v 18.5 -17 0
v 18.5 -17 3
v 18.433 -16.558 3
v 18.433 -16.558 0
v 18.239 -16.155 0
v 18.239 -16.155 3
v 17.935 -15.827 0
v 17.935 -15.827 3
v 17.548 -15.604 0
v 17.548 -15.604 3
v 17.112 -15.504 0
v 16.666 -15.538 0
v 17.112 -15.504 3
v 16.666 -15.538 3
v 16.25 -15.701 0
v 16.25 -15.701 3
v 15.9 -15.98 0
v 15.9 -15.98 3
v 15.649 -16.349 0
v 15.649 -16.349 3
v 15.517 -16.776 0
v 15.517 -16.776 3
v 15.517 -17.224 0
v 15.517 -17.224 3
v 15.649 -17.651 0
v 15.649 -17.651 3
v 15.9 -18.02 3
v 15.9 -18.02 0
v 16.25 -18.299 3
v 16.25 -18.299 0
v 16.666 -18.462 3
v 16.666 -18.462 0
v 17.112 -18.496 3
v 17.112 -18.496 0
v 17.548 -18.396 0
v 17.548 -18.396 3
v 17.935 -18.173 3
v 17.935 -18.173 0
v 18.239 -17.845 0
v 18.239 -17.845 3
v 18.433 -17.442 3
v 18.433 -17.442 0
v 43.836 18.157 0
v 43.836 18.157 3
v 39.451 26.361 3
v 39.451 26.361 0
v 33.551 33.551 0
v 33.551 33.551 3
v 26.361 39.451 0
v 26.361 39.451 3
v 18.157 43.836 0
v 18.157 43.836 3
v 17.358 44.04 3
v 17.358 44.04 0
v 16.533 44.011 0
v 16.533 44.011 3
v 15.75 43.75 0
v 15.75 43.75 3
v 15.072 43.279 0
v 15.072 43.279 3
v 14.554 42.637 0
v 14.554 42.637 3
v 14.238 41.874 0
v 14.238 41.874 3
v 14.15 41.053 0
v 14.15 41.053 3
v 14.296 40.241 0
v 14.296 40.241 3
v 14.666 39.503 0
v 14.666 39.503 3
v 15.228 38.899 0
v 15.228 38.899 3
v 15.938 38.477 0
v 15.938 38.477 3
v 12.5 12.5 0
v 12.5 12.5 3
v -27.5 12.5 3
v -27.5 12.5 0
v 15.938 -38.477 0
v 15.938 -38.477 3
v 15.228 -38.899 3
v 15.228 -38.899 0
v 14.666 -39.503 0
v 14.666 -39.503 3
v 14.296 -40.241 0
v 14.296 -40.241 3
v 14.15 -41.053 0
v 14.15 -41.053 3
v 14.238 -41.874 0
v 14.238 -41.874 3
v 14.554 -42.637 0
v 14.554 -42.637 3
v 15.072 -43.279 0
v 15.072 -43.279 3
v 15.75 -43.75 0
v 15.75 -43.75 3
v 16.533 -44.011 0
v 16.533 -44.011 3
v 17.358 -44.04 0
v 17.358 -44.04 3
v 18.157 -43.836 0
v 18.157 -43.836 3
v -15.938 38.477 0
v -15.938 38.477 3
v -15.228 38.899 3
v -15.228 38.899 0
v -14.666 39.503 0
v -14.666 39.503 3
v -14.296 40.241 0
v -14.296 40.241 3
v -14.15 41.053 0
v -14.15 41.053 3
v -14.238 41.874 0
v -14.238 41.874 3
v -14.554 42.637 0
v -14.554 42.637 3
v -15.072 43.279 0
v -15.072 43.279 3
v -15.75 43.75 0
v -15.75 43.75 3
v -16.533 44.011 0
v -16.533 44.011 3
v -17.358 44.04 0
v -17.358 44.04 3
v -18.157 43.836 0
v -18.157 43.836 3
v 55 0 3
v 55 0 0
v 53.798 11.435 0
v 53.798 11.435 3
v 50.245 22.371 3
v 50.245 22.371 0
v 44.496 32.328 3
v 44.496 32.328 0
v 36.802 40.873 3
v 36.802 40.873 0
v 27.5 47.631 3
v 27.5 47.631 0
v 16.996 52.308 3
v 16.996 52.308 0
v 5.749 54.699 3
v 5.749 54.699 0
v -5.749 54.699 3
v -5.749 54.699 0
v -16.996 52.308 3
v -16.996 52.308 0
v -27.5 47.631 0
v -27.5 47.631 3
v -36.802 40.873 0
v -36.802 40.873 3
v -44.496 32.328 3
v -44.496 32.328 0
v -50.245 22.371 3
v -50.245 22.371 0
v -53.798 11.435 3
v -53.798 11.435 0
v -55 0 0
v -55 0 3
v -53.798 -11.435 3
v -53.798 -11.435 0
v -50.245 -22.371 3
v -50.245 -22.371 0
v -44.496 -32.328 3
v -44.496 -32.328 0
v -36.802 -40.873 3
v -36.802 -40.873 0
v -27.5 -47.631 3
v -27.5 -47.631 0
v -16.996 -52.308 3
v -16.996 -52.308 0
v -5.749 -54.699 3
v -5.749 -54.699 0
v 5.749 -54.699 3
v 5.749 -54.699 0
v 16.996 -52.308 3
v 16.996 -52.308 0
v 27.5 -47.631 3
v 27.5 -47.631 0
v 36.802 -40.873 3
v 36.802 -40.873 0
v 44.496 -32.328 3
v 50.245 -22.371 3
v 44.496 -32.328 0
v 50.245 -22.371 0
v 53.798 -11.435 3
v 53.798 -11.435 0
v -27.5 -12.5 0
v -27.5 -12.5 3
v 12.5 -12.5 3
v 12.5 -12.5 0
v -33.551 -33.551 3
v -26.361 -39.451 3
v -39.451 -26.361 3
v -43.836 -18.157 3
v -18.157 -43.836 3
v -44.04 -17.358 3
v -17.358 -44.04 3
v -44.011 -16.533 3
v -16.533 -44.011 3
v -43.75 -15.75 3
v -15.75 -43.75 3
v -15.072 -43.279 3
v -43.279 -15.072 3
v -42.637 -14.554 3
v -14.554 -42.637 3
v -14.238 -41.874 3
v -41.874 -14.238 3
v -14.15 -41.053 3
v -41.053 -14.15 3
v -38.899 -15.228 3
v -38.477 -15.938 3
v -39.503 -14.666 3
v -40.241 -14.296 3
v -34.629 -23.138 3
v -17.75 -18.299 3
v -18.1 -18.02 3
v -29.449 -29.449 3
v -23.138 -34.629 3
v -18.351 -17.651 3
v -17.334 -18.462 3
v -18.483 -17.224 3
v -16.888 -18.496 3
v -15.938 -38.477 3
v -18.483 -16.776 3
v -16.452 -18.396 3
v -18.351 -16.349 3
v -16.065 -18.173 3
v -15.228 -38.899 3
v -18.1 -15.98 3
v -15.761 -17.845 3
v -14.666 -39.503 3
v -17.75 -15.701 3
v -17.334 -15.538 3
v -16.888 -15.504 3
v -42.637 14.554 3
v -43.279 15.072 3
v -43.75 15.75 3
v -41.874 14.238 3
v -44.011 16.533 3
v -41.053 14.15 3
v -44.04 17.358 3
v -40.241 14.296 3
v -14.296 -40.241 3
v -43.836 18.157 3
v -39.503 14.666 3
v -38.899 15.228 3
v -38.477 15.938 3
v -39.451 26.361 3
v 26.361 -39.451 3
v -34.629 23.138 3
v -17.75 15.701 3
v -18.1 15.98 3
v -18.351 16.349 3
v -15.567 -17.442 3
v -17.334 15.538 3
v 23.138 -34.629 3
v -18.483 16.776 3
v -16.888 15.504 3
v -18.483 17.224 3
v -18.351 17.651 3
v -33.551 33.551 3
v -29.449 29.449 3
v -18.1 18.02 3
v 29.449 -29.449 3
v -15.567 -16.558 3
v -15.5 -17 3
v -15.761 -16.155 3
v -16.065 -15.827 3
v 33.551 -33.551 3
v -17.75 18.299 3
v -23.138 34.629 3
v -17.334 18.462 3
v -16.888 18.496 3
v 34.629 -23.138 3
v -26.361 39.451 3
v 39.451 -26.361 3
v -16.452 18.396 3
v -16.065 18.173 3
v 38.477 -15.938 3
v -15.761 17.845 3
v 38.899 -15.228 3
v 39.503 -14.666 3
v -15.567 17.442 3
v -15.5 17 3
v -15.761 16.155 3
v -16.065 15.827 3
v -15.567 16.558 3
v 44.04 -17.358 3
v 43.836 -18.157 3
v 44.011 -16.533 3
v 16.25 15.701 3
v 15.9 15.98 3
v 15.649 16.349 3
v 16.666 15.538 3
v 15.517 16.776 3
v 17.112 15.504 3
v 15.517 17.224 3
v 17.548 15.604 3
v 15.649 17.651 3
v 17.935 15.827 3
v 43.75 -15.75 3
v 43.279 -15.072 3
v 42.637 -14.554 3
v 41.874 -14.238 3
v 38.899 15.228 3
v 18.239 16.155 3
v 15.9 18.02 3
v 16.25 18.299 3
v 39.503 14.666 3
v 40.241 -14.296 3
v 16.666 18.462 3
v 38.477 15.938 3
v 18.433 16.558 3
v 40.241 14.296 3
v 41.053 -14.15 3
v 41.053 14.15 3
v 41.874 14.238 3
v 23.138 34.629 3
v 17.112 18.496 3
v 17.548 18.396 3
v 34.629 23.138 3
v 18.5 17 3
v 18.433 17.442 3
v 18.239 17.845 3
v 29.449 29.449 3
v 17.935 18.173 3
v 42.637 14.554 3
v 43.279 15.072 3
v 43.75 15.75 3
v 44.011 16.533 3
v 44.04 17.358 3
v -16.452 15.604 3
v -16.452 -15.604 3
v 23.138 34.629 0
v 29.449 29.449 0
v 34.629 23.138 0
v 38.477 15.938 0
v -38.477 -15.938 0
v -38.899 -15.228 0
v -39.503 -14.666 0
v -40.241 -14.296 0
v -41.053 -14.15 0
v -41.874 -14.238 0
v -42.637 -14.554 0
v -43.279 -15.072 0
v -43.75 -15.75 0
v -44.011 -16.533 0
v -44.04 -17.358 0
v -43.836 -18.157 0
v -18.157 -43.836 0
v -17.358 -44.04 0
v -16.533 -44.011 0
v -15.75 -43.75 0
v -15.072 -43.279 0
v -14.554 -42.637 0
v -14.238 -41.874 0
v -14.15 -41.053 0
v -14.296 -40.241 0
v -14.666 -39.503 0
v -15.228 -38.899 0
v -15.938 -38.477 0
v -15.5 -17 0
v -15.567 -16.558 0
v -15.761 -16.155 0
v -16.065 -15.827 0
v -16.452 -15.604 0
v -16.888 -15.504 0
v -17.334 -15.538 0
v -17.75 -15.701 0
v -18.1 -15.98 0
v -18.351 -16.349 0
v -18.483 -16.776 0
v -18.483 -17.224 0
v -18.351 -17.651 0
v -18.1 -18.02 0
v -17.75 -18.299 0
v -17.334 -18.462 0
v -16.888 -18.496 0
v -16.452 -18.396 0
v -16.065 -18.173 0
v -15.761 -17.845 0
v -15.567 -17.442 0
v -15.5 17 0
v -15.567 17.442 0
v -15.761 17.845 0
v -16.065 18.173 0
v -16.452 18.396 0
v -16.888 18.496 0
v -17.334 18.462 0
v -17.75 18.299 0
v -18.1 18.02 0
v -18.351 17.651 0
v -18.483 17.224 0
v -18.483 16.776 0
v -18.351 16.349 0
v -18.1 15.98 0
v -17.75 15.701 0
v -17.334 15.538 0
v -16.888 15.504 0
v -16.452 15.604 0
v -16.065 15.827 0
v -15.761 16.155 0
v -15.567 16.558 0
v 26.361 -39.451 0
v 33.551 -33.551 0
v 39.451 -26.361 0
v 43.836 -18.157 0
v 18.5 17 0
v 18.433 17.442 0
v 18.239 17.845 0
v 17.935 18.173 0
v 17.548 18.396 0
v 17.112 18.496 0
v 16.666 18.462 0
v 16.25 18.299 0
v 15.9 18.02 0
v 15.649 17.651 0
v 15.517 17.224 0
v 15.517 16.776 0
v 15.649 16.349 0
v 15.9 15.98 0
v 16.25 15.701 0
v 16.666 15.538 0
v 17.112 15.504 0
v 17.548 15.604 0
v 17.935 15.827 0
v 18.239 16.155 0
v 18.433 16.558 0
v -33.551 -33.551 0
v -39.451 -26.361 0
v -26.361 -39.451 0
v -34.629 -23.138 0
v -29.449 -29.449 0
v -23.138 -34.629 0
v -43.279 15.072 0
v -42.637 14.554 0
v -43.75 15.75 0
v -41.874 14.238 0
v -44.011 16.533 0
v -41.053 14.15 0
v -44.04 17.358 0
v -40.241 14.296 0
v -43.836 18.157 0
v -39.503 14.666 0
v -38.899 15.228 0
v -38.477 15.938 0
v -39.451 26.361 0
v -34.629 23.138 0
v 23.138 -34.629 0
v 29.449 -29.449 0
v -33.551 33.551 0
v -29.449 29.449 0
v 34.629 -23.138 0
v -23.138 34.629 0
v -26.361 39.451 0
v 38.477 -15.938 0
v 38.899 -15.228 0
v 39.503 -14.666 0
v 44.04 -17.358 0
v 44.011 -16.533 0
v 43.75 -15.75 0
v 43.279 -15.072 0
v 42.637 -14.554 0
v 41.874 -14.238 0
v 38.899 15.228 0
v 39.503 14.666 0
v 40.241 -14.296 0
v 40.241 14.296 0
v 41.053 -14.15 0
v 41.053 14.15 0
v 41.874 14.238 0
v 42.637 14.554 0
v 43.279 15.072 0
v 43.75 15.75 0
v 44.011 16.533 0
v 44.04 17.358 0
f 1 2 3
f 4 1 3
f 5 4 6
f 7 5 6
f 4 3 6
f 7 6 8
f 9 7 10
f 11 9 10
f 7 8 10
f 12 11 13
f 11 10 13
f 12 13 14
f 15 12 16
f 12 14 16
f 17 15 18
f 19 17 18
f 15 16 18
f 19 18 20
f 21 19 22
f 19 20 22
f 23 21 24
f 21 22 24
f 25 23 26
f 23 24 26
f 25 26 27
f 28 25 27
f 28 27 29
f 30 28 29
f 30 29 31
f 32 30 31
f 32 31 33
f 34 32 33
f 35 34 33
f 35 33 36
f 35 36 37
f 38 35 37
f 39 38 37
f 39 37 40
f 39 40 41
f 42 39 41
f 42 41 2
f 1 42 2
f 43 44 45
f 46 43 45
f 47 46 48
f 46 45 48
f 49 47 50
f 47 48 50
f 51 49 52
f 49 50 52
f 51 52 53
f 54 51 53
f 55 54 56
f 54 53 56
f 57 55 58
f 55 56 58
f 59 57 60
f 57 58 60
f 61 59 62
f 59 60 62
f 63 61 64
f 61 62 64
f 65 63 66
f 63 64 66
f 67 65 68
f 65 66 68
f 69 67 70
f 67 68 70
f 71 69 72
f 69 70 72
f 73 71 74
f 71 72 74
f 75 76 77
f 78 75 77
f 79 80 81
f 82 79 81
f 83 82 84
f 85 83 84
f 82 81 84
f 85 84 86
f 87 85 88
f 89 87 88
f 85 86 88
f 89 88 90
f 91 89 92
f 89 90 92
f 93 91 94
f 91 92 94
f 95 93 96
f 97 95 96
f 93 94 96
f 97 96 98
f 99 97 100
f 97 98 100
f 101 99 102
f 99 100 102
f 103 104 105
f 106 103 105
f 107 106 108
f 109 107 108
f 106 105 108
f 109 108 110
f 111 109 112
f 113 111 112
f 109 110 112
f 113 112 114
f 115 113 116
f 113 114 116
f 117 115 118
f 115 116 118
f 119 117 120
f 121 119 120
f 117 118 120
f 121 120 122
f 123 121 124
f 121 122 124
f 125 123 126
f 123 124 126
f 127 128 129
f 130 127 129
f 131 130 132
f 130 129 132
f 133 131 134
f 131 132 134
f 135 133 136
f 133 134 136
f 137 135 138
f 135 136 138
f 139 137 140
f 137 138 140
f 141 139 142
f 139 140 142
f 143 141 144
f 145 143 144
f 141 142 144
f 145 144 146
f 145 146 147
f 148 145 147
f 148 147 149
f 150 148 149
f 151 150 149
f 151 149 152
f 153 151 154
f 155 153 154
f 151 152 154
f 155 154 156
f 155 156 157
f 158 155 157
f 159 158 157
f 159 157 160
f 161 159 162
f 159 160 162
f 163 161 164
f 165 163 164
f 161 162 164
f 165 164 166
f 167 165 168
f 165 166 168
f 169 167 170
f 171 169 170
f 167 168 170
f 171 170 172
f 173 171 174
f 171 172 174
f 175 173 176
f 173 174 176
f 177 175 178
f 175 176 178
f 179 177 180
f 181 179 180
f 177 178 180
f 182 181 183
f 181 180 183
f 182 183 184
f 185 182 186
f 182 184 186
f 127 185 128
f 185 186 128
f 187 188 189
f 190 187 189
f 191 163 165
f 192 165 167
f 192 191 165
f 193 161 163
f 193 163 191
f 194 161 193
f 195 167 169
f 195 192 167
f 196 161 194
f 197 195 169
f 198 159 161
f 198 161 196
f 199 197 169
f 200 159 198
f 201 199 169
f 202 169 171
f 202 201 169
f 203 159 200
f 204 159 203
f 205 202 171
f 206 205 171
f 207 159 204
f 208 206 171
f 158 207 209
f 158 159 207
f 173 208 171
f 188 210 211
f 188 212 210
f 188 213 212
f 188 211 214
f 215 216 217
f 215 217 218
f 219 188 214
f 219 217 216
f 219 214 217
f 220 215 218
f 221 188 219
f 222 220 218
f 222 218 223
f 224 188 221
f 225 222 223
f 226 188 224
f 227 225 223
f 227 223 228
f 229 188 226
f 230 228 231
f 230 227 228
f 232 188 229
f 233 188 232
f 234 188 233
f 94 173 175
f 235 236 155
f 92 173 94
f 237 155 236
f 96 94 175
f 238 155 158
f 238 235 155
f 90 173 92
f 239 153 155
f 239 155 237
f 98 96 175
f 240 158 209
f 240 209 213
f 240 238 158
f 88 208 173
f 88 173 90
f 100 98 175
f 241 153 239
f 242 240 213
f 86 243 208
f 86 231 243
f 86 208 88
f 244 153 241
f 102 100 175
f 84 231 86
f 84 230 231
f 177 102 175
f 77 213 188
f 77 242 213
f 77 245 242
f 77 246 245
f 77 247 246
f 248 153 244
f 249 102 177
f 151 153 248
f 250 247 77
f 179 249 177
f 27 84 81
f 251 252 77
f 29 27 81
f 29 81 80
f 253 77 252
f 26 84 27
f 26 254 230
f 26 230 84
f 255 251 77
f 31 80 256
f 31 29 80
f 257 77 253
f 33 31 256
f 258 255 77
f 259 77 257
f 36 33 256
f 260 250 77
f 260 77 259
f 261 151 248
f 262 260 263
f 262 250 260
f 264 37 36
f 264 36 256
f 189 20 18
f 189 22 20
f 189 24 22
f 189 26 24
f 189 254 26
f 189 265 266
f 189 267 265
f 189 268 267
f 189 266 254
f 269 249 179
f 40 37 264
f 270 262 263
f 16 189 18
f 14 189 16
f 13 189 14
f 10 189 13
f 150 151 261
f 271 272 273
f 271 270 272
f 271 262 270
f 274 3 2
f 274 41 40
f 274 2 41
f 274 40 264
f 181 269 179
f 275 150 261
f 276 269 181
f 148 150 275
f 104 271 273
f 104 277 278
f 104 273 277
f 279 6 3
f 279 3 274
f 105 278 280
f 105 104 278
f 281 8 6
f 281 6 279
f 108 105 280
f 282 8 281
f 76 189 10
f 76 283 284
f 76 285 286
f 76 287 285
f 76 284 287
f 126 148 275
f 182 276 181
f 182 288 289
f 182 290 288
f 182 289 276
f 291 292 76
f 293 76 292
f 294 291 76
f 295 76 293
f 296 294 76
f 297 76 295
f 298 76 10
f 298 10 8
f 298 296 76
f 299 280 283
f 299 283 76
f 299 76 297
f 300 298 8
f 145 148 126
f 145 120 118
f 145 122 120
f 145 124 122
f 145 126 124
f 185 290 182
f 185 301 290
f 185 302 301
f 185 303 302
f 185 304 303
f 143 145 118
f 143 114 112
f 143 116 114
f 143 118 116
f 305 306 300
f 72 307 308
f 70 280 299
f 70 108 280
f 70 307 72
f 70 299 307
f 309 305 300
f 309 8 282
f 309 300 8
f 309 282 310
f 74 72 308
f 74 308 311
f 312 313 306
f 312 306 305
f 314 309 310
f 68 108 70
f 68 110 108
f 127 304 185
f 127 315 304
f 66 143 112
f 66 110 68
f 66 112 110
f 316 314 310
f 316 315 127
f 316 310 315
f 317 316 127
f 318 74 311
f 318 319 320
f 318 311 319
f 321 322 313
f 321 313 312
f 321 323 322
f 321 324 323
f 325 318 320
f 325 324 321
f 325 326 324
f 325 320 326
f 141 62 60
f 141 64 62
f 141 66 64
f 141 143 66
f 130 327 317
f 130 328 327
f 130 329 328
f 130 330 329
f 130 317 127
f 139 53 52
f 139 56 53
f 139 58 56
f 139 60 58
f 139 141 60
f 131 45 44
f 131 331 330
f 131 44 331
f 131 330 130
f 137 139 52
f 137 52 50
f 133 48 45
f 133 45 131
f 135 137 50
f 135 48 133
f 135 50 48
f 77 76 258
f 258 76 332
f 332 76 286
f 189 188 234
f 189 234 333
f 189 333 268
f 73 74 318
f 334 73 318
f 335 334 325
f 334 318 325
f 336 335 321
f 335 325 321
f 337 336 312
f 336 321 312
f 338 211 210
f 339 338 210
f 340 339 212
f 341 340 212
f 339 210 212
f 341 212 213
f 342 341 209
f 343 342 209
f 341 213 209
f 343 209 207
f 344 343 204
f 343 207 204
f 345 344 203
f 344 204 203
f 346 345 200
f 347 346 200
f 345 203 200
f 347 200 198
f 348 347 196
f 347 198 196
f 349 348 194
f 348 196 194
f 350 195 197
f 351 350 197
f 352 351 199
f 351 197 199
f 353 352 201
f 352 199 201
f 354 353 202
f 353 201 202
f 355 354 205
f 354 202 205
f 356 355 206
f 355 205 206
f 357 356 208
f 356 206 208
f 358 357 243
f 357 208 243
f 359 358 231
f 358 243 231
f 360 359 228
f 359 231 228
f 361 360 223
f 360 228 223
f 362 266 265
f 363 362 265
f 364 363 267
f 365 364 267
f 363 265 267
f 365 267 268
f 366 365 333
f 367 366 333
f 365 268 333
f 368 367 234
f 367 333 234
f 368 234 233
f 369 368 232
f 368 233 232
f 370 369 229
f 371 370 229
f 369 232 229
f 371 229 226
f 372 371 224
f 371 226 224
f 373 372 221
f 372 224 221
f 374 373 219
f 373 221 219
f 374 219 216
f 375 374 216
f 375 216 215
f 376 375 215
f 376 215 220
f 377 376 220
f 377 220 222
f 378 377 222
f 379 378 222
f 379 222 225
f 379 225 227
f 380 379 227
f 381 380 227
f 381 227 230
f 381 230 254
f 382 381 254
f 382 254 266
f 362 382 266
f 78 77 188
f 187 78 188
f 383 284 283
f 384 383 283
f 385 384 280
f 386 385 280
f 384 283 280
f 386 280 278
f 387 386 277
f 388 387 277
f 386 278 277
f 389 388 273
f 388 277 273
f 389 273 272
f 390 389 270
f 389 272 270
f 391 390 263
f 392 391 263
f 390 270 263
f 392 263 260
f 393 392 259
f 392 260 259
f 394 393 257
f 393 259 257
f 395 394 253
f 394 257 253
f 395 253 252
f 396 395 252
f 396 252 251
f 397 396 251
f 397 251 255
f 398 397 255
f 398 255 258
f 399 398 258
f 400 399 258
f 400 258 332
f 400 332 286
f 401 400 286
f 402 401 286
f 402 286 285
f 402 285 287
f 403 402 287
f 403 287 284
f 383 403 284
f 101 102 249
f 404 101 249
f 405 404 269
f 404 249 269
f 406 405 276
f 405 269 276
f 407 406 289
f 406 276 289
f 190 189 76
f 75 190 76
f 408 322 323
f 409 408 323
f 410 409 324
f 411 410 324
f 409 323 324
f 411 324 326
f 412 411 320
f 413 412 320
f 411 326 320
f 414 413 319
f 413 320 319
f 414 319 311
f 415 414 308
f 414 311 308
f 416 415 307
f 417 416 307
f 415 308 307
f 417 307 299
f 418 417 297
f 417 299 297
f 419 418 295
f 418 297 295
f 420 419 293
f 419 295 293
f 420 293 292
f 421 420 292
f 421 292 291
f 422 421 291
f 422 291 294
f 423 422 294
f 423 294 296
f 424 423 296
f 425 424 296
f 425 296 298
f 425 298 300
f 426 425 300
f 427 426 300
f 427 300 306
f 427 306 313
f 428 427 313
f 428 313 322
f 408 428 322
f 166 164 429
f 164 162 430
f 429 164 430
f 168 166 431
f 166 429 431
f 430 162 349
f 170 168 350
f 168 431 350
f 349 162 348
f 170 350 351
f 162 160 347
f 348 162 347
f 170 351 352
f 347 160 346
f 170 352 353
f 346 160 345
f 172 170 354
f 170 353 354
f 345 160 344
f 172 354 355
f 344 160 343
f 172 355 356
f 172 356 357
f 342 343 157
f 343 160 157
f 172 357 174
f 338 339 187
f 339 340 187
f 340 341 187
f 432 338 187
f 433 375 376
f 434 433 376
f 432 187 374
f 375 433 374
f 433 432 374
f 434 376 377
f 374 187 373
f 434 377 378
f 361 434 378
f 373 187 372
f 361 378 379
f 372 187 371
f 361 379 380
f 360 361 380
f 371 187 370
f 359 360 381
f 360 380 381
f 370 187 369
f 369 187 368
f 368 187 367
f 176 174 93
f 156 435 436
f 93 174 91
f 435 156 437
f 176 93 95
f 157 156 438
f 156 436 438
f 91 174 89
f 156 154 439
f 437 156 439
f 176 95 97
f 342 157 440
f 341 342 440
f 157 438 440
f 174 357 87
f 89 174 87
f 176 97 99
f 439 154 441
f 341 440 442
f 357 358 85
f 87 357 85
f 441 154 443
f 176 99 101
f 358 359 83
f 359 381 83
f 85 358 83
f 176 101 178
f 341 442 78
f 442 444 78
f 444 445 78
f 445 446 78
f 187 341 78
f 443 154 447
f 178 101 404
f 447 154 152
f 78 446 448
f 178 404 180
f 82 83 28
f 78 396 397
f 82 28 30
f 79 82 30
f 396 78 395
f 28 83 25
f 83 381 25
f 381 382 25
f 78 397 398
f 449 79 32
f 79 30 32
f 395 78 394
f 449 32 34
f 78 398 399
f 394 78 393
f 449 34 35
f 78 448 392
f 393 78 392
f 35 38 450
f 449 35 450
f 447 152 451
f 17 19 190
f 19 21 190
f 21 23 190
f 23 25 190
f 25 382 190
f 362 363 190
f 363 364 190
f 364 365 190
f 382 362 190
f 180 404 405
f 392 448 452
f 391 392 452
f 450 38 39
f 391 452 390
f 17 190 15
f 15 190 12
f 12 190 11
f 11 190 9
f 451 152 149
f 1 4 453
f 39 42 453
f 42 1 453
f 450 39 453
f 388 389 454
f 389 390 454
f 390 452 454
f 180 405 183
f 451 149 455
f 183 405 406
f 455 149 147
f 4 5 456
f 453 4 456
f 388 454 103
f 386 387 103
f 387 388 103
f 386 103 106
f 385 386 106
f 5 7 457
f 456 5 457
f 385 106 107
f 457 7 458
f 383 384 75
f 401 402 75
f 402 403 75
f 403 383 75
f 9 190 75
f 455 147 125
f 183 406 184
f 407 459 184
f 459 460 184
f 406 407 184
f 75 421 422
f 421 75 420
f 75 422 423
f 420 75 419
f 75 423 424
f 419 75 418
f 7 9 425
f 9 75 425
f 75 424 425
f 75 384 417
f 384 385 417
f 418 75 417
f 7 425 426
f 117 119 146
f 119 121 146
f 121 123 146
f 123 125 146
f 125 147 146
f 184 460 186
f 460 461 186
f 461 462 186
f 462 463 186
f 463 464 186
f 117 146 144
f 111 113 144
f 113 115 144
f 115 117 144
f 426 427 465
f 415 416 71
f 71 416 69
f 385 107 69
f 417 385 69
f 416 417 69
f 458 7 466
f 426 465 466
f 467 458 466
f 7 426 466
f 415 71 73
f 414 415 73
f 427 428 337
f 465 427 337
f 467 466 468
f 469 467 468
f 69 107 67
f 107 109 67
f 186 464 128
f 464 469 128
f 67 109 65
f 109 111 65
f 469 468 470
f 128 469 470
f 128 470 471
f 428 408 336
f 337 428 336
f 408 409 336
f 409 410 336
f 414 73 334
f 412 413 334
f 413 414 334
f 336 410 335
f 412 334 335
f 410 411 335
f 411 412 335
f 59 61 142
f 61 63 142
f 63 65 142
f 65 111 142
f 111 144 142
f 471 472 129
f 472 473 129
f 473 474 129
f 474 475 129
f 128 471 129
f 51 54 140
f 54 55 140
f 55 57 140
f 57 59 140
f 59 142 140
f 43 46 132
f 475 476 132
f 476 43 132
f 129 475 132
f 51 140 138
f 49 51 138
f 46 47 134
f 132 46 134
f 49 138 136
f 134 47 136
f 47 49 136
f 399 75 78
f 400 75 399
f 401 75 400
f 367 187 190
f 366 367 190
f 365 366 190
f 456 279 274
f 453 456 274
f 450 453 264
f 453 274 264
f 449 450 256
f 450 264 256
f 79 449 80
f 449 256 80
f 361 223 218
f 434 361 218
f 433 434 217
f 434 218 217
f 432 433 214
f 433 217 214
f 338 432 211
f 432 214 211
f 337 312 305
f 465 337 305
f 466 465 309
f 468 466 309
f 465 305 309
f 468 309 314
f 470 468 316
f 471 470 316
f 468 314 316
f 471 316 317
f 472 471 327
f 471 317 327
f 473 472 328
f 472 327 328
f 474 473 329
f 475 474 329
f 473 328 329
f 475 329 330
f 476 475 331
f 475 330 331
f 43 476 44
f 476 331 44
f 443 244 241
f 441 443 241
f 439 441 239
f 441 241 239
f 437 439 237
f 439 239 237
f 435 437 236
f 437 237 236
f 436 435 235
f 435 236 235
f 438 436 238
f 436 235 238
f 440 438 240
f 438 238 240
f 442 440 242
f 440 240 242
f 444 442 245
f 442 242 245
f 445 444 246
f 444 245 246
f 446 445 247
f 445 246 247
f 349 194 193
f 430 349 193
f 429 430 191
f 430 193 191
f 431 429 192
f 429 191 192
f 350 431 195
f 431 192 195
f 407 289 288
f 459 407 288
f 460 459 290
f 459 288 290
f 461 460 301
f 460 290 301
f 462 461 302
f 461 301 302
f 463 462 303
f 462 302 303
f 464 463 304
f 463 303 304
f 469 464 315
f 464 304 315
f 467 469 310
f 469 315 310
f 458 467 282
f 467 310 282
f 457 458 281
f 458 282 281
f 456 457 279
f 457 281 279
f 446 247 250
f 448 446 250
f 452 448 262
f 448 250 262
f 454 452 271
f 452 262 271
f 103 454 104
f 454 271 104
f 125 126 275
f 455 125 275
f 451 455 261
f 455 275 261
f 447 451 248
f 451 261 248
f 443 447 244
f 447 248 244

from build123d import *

# Parameters (mm, degrees)
SKETCH1_R           = 55
BOSS_EXTRUDE1_DEPTH = 3
CUT_EXTRUDE1_DEPTH  = 78.839578622
SKETCH4_R           = 1.5
CUT_EXTRUDE2_DEPTH  = 78.839578622


with BuildPart() as part:
    # Sketch1 → Boss-Extrude1 (new body)
    with BuildSketch(Plane.XY):
        Circle(SKETCH1_R)
    extrude(amount=BOSS_EXTRUDE1_DEPTH)

    # Sketch3 → Cut-Extrude1 (cut, through all)
    with BuildSketch(Plane.XY.offset(3)):
        with BuildLine():
            ThreePointArc((-15.937895201, 38.477482749), (-14.36842651, 42.266515347), (-18.157459108, 43.835984038))
            ThreePointArc((-18.157459108, 43.835984038), (-33.550609665, 33.550609665), (-43.835984038, 18.157459108))
            ThreePointArc((-43.835984038, 18.157459108), (-42.266515347, 14.36842651), (-38.477482749, 15.937895201))
            ThreePointArc((-38.477482749, 15.937895201), (-29.449390335, 29.449390335), (-15.937895201, 38.477482749))
        make_face()
        with BuildLine():
            ThreePointArc((18.157459108, 43.835984038), (14.36842651, 42.266515347), (15.937895201, 38.477482749))
            ThreePointArc((15.937895201, 38.477482749), (29.449390335, 29.449390335), (38.477482749, 15.937895201))
            ThreePointArc((38.477482749, 15.937895201), (42.266515347, 14.36842651), (43.835984038, 18.157459108))
            ThreePointArc((43.835984038, 18.157459108), (33.550609665, 33.550609665), (18.157459108, 43.835984038))
        make_face()
        with BuildLine():
            ThreePointArc((43.835984038, -18.157459108), (42.266515347, -14.36842651), (38.477482749, -15.937895201))
            ThreePointArc((38.477482749, -15.937895201), (29.449390335, -29.449390335), (15.937895201, -38.477482749))
            ThreePointArc((15.937895201, -38.477482749), (14.36842651, -42.266515347), (18.157459108, -43.835984038))
            ThreePointArc((18.157459108, -43.835984038), (33.550609665, -33.550609665), (43.835984038, -18.157459108))
        make_face()
        with BuildLine():
            ThreePointArc((-18.157459108, -43.835984038), (-14.36842651, -42.266515347), (-15.937895201, -38.477482749))
            ThreePointArc((-15.937895201, -38.477482749), (-29.449390335, -29.449390335), (-38.477482749, -15.937895201))
            ThreePointArc((-38.477482749, -15.937895201), (-42.266515347, -14.36842651), (-43.835984038, -18.157459108))
            ThreePointArc((-43.835984038, -18.157459108), (-33.550609665, -33.550609665), (-18.157459108, -43.835984038))
        make_face()
    extrude(amount=-CUT_EXTRUDE1_DEPTH, mode=Mode.SUBTRACT)

    # Sketch4 → Cut-Extrude2 (cut, through all)
    with BuildSketch(Plane.XY.offset(3)):
        with Locations((-17, 17)):
            Circle(SKETCH4_R)
        with Locations((17, 17)):
            Circle(SKETCH4_R)
        with Locations((17, -17)):
            Circle(SKETCH4_R)
        with Locations((-17, -17)):
            Circle(SKETCH4_R)
        Polygon((-12.5, 12.5), (-27.5, 12.5), (-27.5, -12.5), (-12.5, -12.5), (12.5, -12.5), (12.5, 12.5), align=None)
    extrude(amount=-CUT_EXTRUDE2_DEPTH, mode=Mode.SUBTRACT)


solid = part.part
